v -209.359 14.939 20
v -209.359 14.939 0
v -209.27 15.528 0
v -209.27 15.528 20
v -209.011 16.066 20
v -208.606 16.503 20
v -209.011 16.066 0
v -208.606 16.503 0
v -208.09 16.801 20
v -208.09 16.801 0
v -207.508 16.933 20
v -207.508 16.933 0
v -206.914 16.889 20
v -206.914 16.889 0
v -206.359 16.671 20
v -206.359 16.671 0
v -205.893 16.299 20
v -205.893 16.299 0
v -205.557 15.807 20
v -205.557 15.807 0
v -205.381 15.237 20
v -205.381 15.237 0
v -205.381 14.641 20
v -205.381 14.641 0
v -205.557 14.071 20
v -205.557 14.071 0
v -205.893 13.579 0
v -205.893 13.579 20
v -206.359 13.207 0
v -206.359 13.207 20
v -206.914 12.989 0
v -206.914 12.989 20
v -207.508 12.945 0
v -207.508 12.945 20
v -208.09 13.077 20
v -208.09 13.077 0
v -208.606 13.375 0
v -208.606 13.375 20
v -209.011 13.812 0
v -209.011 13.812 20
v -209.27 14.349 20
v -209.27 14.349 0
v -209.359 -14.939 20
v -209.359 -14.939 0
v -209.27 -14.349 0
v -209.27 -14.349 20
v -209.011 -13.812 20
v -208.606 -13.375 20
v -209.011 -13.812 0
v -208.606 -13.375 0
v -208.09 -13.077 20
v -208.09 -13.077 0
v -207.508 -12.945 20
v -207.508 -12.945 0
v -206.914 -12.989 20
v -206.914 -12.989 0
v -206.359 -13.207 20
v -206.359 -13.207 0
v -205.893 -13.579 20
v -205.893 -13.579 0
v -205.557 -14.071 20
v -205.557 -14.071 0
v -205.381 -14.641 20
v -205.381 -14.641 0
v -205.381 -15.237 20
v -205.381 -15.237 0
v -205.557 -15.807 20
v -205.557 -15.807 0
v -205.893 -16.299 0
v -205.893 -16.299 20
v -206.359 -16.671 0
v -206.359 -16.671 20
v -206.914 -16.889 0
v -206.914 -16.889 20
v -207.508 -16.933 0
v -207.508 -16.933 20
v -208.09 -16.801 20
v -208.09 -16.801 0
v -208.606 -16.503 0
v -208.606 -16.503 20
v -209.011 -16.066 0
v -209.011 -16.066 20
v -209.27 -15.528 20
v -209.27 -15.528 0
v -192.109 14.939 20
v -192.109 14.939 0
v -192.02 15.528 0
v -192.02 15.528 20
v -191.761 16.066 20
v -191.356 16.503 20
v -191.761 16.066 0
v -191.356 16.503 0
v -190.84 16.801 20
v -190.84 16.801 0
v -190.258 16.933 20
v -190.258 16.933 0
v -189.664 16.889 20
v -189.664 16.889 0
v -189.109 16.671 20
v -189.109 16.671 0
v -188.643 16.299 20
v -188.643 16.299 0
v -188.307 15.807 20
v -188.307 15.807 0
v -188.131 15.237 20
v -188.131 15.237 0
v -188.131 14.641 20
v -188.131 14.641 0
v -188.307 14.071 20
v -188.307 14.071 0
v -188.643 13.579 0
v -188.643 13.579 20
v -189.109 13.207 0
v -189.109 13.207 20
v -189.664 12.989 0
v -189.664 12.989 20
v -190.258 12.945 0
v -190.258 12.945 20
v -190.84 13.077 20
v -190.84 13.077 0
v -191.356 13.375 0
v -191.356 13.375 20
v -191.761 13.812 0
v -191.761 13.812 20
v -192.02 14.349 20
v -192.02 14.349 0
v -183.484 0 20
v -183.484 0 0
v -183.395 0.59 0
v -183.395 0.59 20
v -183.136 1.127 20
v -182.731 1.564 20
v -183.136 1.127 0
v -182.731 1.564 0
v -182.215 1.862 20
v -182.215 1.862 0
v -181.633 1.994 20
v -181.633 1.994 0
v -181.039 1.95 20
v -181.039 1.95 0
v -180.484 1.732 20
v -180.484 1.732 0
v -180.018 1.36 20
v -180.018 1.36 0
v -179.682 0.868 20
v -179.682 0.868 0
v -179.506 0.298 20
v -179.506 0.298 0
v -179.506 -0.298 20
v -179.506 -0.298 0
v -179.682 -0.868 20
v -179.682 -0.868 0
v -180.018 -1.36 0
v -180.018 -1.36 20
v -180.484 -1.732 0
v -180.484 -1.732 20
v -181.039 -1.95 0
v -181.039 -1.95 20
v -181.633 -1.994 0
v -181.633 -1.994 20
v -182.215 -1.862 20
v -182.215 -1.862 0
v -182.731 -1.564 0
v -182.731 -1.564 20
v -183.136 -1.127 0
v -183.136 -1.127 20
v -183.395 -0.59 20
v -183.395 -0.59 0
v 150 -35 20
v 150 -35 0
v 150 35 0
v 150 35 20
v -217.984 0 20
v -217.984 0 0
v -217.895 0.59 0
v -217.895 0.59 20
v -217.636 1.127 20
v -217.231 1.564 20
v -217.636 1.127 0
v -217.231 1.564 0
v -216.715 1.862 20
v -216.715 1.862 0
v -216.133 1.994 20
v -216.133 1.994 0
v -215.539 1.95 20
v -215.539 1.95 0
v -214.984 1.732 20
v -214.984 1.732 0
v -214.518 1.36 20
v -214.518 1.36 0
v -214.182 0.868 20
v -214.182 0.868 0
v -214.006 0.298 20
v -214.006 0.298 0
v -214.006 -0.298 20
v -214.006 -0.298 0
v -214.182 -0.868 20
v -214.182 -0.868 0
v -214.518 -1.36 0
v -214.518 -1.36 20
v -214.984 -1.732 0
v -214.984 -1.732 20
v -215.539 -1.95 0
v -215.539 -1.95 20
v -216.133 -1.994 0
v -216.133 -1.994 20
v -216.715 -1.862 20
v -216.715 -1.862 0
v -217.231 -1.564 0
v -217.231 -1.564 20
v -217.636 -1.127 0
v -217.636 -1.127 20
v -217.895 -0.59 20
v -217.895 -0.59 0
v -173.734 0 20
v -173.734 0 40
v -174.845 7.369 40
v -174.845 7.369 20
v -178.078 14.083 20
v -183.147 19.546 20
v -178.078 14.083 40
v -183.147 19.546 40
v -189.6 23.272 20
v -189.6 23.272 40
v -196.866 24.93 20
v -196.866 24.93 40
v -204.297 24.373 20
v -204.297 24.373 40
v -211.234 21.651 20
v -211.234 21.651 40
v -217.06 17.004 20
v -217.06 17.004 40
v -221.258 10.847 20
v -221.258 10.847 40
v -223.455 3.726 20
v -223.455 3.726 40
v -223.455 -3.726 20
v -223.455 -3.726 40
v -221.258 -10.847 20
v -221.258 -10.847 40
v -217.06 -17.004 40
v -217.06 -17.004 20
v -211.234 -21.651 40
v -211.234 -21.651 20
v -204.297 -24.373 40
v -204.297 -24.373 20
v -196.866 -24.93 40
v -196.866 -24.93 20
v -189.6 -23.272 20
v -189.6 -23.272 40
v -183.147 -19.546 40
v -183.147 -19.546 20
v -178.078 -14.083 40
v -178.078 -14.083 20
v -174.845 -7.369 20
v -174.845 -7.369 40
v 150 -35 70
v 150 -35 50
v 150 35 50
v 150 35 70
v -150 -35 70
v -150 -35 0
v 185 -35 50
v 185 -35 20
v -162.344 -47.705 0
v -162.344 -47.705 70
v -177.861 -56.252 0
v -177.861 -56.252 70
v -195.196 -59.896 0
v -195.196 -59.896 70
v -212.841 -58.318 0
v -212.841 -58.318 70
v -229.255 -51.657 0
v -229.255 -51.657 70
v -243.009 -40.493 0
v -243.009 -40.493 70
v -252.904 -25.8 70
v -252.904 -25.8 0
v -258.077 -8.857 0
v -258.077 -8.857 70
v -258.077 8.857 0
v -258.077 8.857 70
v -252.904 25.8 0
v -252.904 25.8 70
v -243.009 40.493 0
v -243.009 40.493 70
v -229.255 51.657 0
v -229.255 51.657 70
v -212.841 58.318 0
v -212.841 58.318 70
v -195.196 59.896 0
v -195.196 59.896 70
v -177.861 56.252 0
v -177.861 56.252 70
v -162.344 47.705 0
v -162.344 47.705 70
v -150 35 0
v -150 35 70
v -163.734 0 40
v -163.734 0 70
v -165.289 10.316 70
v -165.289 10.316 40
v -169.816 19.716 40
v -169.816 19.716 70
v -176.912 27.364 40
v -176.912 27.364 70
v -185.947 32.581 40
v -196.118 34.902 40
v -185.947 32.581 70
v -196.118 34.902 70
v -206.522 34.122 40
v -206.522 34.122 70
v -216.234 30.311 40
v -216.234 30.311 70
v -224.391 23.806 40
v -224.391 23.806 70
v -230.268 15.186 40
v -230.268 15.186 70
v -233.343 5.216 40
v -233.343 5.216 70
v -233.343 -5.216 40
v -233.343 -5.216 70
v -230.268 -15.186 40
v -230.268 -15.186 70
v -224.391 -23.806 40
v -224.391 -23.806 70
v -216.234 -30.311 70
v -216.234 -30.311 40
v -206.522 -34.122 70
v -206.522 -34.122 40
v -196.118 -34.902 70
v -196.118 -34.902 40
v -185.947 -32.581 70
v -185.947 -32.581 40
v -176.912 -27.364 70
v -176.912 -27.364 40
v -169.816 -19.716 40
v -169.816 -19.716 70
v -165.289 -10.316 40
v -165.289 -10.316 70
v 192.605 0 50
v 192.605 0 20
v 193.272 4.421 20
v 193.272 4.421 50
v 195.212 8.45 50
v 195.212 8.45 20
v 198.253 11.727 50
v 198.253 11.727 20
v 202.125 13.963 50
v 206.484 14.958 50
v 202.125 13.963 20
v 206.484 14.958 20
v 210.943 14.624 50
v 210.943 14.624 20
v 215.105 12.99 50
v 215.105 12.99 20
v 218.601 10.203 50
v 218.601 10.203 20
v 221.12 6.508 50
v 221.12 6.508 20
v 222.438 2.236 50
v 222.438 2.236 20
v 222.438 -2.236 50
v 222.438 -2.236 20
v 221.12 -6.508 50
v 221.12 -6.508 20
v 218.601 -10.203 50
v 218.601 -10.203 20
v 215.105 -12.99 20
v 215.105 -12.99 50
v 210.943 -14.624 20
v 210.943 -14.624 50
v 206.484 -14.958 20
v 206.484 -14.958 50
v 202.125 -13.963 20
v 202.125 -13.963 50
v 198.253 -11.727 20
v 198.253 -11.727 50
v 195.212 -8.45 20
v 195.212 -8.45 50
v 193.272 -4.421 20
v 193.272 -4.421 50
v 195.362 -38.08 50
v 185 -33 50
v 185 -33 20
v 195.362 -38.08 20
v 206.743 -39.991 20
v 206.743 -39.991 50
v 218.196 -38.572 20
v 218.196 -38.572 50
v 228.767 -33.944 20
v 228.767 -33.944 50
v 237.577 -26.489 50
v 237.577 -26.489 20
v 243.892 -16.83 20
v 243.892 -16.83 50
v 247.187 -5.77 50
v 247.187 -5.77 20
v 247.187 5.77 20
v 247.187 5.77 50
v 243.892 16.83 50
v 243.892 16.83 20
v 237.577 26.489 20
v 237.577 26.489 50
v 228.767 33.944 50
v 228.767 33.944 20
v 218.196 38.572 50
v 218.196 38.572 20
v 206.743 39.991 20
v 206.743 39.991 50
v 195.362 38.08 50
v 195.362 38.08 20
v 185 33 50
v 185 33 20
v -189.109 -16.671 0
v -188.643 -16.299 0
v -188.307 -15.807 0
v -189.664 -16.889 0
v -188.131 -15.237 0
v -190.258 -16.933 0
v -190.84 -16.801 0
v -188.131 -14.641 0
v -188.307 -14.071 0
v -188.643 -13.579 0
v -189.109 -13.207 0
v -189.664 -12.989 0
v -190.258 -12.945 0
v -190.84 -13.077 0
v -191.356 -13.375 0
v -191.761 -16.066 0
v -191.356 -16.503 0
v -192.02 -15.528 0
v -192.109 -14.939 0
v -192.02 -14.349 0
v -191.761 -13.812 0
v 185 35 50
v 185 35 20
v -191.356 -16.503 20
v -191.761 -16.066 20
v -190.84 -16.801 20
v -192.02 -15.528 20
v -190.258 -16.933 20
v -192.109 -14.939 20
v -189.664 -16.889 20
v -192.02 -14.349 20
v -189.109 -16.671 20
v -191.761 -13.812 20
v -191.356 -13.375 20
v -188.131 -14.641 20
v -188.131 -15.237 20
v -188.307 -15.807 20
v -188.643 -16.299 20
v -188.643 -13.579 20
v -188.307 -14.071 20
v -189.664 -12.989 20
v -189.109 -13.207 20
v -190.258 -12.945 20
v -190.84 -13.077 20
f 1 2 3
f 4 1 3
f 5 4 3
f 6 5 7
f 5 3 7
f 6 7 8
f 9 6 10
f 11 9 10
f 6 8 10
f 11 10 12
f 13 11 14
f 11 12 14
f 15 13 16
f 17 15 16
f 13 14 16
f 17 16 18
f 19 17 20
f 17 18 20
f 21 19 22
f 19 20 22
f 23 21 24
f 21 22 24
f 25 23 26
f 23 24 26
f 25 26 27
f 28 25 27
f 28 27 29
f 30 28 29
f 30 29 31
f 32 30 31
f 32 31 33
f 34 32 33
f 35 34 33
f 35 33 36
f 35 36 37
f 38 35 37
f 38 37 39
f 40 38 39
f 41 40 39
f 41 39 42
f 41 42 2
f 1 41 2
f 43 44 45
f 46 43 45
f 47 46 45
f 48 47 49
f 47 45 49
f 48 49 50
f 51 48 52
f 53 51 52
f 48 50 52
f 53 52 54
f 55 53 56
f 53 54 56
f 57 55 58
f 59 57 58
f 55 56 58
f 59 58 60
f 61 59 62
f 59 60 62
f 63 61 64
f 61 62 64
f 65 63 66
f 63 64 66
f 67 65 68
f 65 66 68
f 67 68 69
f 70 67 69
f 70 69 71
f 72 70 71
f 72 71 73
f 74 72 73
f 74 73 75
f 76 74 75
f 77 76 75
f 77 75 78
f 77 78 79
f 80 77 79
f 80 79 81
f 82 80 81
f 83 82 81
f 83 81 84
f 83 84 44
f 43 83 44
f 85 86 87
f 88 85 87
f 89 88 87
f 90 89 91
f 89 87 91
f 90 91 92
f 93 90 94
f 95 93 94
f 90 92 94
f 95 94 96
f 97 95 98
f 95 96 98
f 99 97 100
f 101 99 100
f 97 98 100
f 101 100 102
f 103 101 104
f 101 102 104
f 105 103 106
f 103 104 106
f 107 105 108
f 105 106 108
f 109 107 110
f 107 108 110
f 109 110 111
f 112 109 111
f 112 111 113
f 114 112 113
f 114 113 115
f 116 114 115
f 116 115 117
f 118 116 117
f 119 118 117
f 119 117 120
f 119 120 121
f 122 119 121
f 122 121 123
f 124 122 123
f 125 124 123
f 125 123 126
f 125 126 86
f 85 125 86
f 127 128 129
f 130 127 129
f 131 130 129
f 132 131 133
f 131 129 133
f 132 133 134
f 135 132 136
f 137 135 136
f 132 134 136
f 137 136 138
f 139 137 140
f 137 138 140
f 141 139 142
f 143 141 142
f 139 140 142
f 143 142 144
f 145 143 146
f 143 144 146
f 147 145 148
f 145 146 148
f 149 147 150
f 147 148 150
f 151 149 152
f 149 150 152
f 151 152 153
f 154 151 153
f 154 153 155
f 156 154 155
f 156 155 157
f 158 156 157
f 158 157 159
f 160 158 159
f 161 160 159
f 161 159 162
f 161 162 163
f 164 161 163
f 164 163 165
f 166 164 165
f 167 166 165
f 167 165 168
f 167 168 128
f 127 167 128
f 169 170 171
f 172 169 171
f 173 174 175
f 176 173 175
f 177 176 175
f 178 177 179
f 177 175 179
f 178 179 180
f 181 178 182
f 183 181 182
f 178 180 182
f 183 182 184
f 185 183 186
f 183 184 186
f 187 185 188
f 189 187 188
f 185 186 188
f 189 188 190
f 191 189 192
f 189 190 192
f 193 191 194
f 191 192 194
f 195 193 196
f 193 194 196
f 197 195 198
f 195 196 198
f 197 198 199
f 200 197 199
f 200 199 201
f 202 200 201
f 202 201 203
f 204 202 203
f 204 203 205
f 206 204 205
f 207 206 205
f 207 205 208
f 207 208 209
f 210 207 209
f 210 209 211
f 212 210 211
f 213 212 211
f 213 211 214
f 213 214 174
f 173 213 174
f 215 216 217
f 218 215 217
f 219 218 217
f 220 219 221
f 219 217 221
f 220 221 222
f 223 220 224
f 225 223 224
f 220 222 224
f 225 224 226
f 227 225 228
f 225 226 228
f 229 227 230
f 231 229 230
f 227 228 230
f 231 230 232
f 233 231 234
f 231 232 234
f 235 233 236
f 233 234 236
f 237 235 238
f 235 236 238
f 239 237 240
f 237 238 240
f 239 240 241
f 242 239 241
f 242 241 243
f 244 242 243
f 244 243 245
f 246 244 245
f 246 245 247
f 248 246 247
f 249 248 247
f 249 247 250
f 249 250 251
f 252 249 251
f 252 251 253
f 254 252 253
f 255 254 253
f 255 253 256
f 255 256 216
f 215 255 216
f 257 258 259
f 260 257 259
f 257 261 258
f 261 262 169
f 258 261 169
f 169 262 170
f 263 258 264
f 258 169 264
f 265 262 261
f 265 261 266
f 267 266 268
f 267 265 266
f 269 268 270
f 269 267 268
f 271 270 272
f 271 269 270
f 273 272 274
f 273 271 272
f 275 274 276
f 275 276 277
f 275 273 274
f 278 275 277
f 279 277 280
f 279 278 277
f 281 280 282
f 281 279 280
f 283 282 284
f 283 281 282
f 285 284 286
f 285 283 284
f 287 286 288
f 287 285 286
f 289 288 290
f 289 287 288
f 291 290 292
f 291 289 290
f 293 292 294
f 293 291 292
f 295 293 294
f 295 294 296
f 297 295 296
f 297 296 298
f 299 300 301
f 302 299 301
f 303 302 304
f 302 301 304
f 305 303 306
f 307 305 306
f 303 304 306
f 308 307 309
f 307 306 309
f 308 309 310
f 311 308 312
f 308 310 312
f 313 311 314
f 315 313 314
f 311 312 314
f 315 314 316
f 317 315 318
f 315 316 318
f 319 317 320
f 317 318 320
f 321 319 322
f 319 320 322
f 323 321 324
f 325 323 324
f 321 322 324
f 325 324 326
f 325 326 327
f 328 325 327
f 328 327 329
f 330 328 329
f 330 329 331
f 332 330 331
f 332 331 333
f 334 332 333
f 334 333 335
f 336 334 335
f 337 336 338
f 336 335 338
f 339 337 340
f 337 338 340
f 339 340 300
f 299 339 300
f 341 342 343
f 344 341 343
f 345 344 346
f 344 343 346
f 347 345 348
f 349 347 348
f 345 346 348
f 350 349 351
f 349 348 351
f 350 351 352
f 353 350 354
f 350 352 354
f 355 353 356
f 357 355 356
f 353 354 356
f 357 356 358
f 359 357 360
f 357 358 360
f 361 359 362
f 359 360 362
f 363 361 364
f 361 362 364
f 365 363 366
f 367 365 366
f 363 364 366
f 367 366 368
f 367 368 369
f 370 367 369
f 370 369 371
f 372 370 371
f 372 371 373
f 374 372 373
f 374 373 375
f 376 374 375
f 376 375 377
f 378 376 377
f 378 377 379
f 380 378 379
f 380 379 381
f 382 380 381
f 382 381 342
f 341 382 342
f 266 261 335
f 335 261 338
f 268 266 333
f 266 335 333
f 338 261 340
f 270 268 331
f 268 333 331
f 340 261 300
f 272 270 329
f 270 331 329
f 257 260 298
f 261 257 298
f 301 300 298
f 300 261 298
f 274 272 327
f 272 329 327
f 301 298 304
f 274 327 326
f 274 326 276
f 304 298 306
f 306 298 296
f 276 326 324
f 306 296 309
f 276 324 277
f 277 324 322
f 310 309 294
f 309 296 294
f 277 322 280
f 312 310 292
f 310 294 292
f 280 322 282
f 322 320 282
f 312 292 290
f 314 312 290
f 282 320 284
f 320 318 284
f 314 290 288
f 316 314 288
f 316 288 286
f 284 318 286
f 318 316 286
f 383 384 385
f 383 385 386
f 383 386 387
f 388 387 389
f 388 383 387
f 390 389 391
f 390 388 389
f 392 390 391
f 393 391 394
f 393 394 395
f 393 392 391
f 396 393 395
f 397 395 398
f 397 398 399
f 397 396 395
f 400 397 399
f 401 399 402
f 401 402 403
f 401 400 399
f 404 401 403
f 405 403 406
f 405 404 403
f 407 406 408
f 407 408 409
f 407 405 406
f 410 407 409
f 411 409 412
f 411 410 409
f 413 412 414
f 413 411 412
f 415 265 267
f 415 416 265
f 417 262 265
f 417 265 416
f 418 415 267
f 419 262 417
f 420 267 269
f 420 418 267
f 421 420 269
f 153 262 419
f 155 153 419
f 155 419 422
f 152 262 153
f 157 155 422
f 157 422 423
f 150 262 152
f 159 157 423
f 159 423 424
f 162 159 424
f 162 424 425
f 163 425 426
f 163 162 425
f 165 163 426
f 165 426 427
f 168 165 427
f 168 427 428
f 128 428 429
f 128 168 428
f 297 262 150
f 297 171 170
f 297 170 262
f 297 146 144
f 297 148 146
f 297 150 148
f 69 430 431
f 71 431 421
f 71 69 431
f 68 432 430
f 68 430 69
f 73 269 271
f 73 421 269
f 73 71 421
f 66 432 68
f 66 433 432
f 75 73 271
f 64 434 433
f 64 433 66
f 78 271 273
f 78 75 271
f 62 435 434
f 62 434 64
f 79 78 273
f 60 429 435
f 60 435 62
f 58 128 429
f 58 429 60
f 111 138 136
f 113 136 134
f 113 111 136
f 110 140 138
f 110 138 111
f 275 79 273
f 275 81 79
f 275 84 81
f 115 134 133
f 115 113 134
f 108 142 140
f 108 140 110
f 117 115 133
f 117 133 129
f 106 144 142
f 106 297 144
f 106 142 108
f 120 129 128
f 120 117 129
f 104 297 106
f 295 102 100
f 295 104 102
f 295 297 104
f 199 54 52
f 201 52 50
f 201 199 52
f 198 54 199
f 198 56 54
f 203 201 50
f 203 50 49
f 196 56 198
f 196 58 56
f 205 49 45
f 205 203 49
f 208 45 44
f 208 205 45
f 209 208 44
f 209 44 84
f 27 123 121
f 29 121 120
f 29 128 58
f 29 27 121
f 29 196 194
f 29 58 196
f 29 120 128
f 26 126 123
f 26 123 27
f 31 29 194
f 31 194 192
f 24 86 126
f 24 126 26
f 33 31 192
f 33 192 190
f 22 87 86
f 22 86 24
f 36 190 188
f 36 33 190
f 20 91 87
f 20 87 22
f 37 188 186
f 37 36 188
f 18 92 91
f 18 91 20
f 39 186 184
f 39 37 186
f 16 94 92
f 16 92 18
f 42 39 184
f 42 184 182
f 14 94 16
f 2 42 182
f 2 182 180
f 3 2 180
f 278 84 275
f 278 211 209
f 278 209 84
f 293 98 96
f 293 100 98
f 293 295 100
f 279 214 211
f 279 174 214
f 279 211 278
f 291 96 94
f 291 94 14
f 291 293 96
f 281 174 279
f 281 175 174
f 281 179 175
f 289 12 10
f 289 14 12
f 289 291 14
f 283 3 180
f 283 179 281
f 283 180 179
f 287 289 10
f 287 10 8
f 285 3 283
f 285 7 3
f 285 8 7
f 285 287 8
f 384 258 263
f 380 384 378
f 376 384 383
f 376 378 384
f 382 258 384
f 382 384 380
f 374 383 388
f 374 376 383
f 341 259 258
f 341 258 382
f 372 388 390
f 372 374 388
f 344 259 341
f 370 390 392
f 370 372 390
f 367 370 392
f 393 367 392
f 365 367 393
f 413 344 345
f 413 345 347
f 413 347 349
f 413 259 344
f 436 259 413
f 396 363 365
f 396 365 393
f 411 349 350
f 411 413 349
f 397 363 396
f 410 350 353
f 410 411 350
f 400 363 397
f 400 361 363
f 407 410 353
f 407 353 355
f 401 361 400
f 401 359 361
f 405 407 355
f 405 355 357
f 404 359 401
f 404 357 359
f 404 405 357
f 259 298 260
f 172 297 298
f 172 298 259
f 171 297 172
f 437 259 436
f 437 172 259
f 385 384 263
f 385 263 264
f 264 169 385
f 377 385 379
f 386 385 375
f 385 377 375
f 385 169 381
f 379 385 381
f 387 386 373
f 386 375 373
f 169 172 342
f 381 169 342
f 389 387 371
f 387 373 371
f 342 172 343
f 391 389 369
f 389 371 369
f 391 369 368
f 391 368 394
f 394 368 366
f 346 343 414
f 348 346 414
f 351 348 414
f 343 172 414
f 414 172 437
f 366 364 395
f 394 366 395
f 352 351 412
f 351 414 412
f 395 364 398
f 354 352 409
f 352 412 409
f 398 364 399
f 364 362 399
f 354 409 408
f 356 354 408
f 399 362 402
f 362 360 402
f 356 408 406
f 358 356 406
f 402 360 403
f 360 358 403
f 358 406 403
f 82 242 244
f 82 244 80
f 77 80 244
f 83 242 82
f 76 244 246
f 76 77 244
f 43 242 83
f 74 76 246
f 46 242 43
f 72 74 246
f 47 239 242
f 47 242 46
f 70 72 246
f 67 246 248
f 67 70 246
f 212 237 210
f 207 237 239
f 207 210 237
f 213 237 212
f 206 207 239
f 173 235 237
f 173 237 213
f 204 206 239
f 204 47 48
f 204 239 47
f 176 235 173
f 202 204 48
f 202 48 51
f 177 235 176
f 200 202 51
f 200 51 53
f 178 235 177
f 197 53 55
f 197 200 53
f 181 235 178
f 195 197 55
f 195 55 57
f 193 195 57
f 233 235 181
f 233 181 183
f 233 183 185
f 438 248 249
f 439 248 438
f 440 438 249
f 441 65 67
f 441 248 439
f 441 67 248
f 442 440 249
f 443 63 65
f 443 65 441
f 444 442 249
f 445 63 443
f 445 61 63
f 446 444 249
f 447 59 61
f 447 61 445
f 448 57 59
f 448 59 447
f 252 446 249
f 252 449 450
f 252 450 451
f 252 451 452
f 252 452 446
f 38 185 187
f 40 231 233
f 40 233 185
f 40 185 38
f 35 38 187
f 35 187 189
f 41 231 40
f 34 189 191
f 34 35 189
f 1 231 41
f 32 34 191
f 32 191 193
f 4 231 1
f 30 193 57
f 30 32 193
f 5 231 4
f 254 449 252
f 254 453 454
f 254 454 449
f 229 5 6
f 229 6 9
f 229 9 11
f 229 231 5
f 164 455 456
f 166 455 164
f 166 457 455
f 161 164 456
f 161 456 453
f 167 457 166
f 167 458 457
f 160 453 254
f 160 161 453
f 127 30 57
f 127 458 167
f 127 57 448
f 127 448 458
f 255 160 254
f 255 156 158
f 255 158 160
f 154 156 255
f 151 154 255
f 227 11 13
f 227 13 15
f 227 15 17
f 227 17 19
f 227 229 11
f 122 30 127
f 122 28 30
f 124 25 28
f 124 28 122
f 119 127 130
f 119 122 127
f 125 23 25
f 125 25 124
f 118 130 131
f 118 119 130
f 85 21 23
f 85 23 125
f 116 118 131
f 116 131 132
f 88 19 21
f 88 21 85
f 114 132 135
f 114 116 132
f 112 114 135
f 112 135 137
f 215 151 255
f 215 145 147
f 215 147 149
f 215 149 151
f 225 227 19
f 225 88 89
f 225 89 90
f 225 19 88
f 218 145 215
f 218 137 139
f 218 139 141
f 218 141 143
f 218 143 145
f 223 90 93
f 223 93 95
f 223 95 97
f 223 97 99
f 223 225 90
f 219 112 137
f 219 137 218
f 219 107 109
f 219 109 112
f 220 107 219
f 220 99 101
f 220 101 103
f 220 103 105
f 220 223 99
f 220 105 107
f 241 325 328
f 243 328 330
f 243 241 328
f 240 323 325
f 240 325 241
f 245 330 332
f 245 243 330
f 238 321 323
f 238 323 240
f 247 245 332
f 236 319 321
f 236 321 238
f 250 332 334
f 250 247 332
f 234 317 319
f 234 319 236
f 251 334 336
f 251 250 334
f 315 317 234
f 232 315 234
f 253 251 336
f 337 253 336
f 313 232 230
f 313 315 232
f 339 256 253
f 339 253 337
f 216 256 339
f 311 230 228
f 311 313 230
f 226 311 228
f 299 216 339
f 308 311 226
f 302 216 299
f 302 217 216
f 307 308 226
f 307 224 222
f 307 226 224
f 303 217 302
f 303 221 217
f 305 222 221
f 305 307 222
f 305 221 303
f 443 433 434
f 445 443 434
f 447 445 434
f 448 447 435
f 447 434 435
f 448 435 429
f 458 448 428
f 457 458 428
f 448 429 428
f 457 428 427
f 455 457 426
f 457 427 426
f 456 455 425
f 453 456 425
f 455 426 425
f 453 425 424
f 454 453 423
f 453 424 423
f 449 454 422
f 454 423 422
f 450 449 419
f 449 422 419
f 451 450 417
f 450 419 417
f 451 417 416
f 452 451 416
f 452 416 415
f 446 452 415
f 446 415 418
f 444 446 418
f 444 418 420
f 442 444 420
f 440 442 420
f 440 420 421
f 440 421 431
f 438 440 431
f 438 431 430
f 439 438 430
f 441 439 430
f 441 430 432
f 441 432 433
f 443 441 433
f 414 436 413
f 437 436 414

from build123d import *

# Parameters (mm, degrees)
SKETCH_1_W          = 300
SKETCH_1_H          = 70
EXTRUDE_1_DEPTH     = 70
SKETCH_2_R          = 60
EXTRUDE_2_DEPTH     = 70
SKETCH_3_W          = 35
SKETCH_3_H          = 30
EXTRUDE_3_DEPTH     = 70
SKETCH_5_R          = 40
EXTRUDE_5_DEPTH     = 30
SKETCH_6_R          = 15
CUT_EXTRUDE_1_DEPTH = 271.265181117
SKETCH_7_R          = 2
CUT_EXTRUDE_2_DEPTH = 275.669379662
SKETCH_8_R          = 25
CUT_EXTRUDE_3_DEPTH = 50
SKETCH_9_R          = 35
CUT_EXTRUDE_4_DEPTH = 30


with BuildPart() as part:
    # 草图1 → 凸台-拉伸1 (new body)
    with BuildSketch(Plane.XY):
        Rectangle(SKETCH_1_W, SKETCH_1_H)
    extrude(amount=EXTRUDE_1_DEPTH)

    # 草图2 → 凸台-拉伸2 (add)
    with BuildSketch(Plane(origin=(0, 0, 0), x_dir=(-1, 0, 0), z_dir=(0, 0, -1))):
        with Locations((198.733971724, 0)):
            Circle(SKETCH_2_R)
    extrude(amount=-EXTRUDE_2_DEPTH)

    # 草图3 → 凸台-拉伸3 (add)
    with BuildSketch(Plane(origin=(0, 35, 0), x_dir=(1, 0, 0), z_dir=(0, 1, 0))):
        with Locations((167.5, -35)):
            Rectangle(SKETCH_3_W, SKETCH_3_H)
    extrude(amount=-EXTRUDE_3_DEPTH)

    # 草图5 → 凸台-拉伸5 (add)
    with BuildSketch(Plane.XY.offset(50)):
        with Locations((207.605309111, 0)):
            Circle(SKETCH_5_R)
    extrude(amount=-EXTRUDE_5_DEPTH)

    # 草图6 → 切除-拉伸1 (cut, through all)
    with BuildSketch(Plane(origin=(0, 0, 20), x_dir=(-1, 0, 0), z_dir=(0, 0, -1))):
        with Locations((-207.605309111, 0)):
            Circle(SKETCH_6_R)
    extrude(amount=-CUT_EXTRUDE_1_DEPTH, mode=Mode.SUBTRACT)

    # 草图7 → 切除-拉伸2 (cut, through all)
    with BuildSketch(Plane(origin=(0, 0, 0), x_dir=(-1, 0, 0), z_dir=(0, 0, -1))):
        with Locations((215.983971724, 0)):
            Circle(SKETCH_7_R)
        with Locations((207.358971724, -14.938938215)):
            Circle(SKETCH_7_R)
        with Locations((190.108971724, -14.938938215)):
            Circle(SKETCH_7_R)
        with Locations((181.483971724, 0)):
            Circle(SKETCH_7_R)
        with Locations((190.108971724, 14.938938215)):
            Circle(SKETCH_7_R)
        with Locations((207.358971724, 14.938938215)):
            Circle(SKETCH_7_R)
    extrude(amount=-CUT_EXTRUDE_2_DEPTH, mode=Mode.SUBTRACT)

    # 草图8 → 切除-拉伸3 (cut)
    with BuildSketch(Plane.XY.offset(70)):
        with Locations((-198.733971724, 0)):
            Circle(SKETCH_8_R)
    extrude(amount=-CUT_EXTRUDE_3_DEPTH, mode=Mode.SUBTRACT)

    # 草图9 → 切除-拉伸4 (cut)
    with BuildSketch(Plane.XY.offset(70)):
        with Locations((-198.733971724, 0)):
            Circle(SKETCH_9_R)
    extrude(amount=-CUT_EXTRUDE_4_DEPTH, mode=Mode.SUBTRACT)


solid = part.part
